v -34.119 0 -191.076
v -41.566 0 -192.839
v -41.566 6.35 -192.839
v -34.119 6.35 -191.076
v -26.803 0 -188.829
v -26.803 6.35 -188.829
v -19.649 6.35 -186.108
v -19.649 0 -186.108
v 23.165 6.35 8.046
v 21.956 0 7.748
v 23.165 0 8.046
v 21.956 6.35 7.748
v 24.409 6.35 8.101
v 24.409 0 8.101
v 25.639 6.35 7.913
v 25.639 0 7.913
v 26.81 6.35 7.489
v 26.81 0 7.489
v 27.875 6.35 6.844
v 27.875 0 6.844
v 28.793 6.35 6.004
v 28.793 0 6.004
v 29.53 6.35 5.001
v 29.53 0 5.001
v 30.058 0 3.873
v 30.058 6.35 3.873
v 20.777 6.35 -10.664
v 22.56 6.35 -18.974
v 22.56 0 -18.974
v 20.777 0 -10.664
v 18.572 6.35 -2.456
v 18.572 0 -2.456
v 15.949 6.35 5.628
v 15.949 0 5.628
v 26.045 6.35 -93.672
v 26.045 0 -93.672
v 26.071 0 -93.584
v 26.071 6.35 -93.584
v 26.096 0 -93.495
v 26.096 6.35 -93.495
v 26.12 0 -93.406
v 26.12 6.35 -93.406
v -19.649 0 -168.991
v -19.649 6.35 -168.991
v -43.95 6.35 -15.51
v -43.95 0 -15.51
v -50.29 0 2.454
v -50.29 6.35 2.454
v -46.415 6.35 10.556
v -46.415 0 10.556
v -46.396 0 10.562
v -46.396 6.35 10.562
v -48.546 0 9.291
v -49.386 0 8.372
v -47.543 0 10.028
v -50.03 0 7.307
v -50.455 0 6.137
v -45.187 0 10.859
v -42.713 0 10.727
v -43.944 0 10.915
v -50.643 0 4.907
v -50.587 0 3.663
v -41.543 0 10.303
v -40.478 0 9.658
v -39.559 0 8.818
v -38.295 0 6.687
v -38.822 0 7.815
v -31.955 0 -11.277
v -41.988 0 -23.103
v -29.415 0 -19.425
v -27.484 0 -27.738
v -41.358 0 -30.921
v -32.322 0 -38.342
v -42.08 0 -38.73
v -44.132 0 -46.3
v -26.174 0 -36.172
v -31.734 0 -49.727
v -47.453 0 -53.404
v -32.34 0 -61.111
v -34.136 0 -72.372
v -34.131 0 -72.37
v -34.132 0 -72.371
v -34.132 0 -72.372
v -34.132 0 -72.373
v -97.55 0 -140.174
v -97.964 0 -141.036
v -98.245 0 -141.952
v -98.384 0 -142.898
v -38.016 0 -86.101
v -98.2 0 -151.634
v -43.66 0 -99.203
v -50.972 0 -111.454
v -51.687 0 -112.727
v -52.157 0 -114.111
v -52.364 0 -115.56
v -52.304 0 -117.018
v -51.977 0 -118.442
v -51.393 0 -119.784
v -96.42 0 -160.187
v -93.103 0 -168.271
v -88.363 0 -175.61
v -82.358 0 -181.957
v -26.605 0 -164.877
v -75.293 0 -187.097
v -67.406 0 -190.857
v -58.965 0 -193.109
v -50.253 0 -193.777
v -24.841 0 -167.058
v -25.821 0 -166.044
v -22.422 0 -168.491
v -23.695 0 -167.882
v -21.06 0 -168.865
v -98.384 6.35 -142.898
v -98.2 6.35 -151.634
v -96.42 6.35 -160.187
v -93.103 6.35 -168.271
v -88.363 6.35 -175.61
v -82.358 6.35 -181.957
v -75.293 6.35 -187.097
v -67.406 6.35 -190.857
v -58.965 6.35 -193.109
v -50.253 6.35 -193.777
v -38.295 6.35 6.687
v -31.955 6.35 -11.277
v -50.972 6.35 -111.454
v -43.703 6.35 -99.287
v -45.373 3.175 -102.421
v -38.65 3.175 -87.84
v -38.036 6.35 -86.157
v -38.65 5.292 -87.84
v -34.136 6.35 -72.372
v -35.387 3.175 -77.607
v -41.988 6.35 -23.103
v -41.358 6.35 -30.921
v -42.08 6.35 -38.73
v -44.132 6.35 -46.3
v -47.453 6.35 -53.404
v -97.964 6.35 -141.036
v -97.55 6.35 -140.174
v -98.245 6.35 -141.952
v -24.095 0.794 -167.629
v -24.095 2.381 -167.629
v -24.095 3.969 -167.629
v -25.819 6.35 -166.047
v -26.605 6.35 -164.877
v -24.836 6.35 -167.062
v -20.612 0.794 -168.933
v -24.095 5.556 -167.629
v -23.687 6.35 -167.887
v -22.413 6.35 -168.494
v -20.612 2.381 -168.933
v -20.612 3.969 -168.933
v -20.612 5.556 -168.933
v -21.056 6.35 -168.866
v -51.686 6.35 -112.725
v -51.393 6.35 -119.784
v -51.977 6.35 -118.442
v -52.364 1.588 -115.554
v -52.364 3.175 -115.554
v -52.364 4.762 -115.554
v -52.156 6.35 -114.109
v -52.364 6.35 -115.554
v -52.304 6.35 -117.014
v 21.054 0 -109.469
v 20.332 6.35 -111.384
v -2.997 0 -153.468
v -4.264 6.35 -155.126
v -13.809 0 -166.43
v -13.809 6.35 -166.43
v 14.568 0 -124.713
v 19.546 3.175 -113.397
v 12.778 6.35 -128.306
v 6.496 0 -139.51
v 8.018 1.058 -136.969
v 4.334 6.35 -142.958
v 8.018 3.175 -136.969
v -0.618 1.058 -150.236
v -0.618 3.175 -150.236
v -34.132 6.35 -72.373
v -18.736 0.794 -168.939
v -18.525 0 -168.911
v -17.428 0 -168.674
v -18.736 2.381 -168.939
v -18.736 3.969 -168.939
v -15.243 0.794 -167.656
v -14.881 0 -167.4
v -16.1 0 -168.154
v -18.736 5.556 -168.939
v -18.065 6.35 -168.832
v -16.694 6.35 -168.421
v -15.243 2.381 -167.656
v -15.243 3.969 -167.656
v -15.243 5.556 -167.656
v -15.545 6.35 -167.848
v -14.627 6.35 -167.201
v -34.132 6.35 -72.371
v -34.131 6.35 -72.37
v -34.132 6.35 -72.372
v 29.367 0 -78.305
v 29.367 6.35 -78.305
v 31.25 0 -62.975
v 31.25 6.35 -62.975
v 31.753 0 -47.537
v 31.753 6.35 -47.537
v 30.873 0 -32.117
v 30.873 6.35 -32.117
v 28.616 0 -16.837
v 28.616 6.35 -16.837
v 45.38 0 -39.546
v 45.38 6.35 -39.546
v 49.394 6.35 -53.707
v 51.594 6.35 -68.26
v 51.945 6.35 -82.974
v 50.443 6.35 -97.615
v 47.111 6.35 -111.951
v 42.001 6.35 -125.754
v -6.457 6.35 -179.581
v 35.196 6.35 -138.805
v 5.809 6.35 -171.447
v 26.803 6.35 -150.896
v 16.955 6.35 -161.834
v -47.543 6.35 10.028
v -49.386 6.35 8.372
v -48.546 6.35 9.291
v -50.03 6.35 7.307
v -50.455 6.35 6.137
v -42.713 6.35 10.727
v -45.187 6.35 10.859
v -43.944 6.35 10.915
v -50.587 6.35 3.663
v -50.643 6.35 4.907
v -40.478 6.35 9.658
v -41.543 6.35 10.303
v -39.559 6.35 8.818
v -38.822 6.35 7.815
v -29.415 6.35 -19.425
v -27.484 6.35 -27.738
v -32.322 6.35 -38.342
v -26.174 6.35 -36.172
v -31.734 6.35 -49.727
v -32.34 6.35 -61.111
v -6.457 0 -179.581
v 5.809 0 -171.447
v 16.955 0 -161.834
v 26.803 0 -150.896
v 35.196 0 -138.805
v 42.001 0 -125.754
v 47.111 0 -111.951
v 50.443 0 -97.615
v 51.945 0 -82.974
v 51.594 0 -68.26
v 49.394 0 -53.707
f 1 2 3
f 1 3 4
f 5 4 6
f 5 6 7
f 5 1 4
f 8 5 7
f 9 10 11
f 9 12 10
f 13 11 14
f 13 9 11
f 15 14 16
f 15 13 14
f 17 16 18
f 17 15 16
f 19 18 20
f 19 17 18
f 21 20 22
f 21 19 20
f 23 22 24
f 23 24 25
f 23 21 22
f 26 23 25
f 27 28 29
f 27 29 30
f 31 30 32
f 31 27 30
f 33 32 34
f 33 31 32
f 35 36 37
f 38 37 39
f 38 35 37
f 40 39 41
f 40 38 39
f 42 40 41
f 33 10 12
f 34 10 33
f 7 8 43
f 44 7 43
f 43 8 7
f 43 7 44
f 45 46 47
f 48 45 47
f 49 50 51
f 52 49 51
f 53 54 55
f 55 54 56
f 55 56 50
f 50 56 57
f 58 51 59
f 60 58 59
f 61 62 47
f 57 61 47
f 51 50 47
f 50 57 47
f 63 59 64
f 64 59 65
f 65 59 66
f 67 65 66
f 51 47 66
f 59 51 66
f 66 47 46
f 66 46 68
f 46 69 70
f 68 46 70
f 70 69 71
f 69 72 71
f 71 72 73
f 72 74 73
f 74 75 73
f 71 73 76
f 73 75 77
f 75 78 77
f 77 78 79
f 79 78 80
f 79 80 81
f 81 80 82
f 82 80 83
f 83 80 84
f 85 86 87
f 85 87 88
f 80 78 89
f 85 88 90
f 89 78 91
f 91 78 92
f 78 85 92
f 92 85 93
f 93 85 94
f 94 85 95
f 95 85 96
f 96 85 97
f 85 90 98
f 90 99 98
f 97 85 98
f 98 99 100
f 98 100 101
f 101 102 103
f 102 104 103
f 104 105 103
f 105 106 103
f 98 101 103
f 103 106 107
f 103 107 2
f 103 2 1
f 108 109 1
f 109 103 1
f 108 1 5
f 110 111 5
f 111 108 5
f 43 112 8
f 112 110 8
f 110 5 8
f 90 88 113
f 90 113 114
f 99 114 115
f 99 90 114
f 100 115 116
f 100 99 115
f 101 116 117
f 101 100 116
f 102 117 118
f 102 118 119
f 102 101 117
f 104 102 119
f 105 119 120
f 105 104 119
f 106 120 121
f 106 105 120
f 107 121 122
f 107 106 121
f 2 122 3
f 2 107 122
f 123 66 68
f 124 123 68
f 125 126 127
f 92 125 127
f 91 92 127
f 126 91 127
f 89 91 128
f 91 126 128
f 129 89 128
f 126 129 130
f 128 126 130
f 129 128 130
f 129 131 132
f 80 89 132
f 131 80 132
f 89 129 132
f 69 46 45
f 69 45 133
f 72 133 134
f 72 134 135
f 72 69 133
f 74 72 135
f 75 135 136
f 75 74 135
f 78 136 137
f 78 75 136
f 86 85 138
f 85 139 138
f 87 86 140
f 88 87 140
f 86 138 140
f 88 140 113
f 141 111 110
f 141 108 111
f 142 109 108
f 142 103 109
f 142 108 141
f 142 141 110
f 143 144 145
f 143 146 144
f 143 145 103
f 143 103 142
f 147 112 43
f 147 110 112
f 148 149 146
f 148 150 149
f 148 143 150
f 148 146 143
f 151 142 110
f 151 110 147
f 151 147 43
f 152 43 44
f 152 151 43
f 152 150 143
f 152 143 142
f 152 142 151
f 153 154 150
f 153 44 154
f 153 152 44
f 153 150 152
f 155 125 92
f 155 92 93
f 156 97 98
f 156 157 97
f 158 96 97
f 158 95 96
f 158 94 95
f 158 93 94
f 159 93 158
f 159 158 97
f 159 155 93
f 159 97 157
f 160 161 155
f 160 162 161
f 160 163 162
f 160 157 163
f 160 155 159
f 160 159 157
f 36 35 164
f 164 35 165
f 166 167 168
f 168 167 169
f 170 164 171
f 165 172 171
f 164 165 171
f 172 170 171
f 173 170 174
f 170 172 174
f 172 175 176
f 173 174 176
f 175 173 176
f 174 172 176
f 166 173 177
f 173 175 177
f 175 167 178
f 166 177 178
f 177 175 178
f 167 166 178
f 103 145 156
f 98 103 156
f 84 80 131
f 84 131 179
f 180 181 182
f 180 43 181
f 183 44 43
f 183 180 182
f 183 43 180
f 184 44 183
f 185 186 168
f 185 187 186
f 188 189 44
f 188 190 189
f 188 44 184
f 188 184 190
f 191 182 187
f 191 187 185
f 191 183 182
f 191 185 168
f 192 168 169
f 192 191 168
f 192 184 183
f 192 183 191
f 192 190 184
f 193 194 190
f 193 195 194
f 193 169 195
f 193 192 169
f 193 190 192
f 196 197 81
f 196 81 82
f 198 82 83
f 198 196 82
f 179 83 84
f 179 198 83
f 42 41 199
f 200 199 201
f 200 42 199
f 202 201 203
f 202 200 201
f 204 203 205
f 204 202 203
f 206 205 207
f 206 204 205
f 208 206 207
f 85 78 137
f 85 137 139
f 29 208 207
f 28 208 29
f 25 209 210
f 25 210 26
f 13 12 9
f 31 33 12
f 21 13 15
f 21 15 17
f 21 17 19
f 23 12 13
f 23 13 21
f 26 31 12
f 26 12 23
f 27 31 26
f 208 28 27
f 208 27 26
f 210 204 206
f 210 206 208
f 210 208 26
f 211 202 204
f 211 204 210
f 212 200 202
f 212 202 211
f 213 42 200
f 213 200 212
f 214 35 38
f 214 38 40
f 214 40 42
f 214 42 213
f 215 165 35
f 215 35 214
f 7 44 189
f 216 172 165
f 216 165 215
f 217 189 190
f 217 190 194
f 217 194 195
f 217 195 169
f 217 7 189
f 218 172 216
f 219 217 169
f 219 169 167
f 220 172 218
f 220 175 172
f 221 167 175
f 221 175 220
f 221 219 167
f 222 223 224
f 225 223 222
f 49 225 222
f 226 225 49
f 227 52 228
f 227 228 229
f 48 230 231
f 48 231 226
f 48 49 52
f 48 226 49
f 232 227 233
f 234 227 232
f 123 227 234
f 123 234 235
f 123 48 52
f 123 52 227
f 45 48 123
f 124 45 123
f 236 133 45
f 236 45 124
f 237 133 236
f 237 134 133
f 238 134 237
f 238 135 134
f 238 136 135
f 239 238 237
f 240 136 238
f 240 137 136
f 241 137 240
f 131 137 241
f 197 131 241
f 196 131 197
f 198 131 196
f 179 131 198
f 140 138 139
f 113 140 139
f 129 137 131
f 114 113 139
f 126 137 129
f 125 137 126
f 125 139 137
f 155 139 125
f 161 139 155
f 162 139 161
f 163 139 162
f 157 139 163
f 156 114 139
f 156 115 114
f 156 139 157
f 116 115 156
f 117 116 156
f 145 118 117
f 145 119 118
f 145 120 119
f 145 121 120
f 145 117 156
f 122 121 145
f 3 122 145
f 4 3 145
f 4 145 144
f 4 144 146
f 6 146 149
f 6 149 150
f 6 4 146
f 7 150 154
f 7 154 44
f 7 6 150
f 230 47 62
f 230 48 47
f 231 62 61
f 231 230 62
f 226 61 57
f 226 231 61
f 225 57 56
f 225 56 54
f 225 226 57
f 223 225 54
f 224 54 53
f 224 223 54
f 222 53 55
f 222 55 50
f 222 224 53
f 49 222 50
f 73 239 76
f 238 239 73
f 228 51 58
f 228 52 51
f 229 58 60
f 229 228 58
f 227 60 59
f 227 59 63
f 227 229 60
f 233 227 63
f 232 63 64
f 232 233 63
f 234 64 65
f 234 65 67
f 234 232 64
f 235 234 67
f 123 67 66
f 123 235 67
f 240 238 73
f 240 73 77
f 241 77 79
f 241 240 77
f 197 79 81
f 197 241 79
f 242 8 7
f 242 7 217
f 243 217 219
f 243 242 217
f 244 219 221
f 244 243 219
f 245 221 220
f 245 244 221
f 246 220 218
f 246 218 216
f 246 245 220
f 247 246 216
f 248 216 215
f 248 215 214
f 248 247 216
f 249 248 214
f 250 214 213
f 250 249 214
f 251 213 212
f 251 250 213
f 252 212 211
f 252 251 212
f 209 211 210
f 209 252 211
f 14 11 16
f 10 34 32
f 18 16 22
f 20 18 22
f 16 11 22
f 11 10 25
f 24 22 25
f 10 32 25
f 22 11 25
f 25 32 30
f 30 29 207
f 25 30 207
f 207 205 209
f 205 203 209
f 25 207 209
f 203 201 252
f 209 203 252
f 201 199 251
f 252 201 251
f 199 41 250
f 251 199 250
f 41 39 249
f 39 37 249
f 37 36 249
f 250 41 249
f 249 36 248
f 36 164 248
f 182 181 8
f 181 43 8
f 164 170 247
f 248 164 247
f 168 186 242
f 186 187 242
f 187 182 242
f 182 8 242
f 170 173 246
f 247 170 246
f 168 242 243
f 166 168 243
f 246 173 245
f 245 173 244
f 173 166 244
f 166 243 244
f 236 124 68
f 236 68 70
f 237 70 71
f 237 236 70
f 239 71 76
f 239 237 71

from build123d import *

# Parameters (mm, degrees)
BOSS_EXTRUDE1_DEPTH    = 6.35
CUT_EXTRUDE1_DEPTH     = 218.474824132
CUT_EXTRUDE2_DEPTH     = 218.474824132
BOSS_EXTRUDE2_DEPTH    = 6.35
FILLET1_R              = 6.35
SPLIT1_SURFACE_1_BACK  = 255.18
SPLIT1_SURFACE_1_DEPTH = 510.36
SPLIT1_SURFACE_2_BACK  = 255.18
SPLIT1_SURFACE_2_DEPTH = 510.36


with BuildPart() as part:
    # Sketch1 → Boss-Extrude1 (new body)
    with BuildSketch(Plane(origin=(0, 0, 0), x_dir=(1, 0, 0), z_dir=(0, 1, 0))):
        with BuildLine():
            Line((-47.453228006, 53.404284402), (-98.253228006, 141.392465427))
            ThreePointArc((-98.253228006, 141.392465427), (-82.921975522, 181.453316928), (-41.566473575, 192.839342769))
            ThreePointArc((-41.566473575, 192.839342769), (36.836225704, 136.004392842), (45.380299153, 39.546144899))
            Line((45.380299153, 39.546144899), (27.944541838, -9.861512816))
            Line((27.944541838, -9.861512816), (0, 0))
            Line((0, 0), (-43.950457827, 15.509934128))
            ThreePointArc((-43.950457827, 15.509934128), (-41.550098289, 34.840876427), (-47.453228006, 53.404284402))
        make_face()
    extrude(amount=BOSS_EXTRUDE1_DEPTH)

    # Sketch5 → Cut-Extrude1 (cut, through all)
    with BuildSketch(Plane(origin=(0, 6.35, 0), x_dir=(1, 0, 0), z_dir=(0, 1, 0))):
        with BuildLine():
            Line((-29.23664893, 81.427581144), (15.574383155, 98.792652007))
            ThreePointArc((15.574383155, 98.792652007), (22.053436092, 98.460407789), (26.120098061, 93.405630482))
            ThreePointArc((26.120098061, 93.405630482), (31.67419382, 55.261505814), (28.616328902, 16.836622098))
            Line((28.616328902, 16.836622098), (22.559524164, 18.974043348))
            ThreePointArc((22.559524164, 18.974043348), (19.726825076, 6.545871538), (15.949337201, -5.628454892))
            Line((15.949337201, -5.628454892), (-31.95525319, 11.276876204))
            ThreePointArc((-31.95525319, 11.276876204), (-28.372538305, 23.563648828), (-26.173781301, 36.171824553))
            Line((-26.173781301, 36.171824553), (-32.322028113, 38.341515332))
            ThreePointArc((-32.322028113, 38.341515332), (-31.887912186, 55.427050363), (-34.131380562, 72.370214577))
            ThreePointArc((-34.131380562, 72.370214577), (-33.353370645, 77.801041885), (-29.23664893, 81.427581144))
        make_face()
    extrude(amount=-CUT_EXTRUDE1_DEPTH, mode=Mode.SUBTRACT)

    # Sketch6 → Cut-Extrude2 (cut, through all)
    with BuildSketch(Plane(origin=(0, 6.35, 0), x_dir=(1, 0, 0), z_dir=(0, 1, 0))):
        with BuildLine():
            Line((-34.136031583, 72.371811773), (26.116293886, 93.401758977))
            add(Edge.make_bspline(
                [(26.116293886, 93.401758977), (24.324889601, 100.23803776), (22.130168151, 106.901258397), (16.96212823, 119.893613822), (13.988046064, 126.222420918), (9.776956475, 133.921680991), (8.910007749, 135.450921337), (7.126151123, 138.487965199), (6.207974968, 139.997768114), (3.386426272, 144.480432789), (1.42392697, 147.394611788), (-4.701484626, 155.920269738), (-9.100754748, 161.316287945), (-13.809441186, 166.430246232)],
                knots=[0, 0, 0, 0, 0.25, 0.25, 0.5, 0.5, 0.5625, 0.5625, 0.625, 0.625, 0.75, 0.75, 1, 1, 1, 1], degree=3))
            add(Edge.make_bspline(
                [(-26.604572492, 164.8773905), (-26.150591479, 165.703254328), (-25.515446259, 166.400295605), (-24.879031904, 167.098729697), (-24.095373437, 167.628794259), (-23.313760397, 168.1574753), (-22.428907317, 168.488425961), (-21.547481327, 168.818094831), (-20.612298709, 168.932538075), (-19.674896196, 169.047252981), (-18.735576663, 168.938540794), (-17.797334242, 168.829953267), (-16.909699728, 168.503685222), (-16.026331795, 168.178985445), (-15.242553256, 167.655985099), (-14.452846951, 167.129029268), (-13.809441186, 166.430246232)],
                knots=[0, 0, 0, 0.125, 0.125, 0.25, 0.25, 0.375, 0.375, 0.5, 0.5, 0.625, 0.625, 0.75, 0.75, 0.875, 0.875, 1, 1, 1], degree=2))
            Line((-26.604572492, 164.8773905), (-51.39264493, 119.783935416))
            add(Edge.make_bspline(
                [(-50.971516495, 111.453693883), (-51.597295758, 112.361285599), (-51.952278538, 113.405618938), (-52.307499269, 114.450652309), (-52.364051333, 115.554155451), (-52.420577964, 116.657162304), (-52.173441916, 117.734834771), (-51.926064332, 118.813560494), (-51.39264493, 119.783935416)],
                knots=[0, 0, 0, 0.25, 0.25, 0.5, 0.5, 0.75, 0.75, 1, 1, 1], degree=2))
            add(Edge.make_bspline(
                [(-50.971516495, 111.453693883), (-48.958817602, 108.534599247), (-47.092599274, 105.523689489), (-43.653878745, 99.317766492), (-42.08164257, 96.122586505), (-39.950407344, 91.187456603), (-39.27814351, 89.518531936), (-38.021441634, 86.160956199), (-37.435479748, 84.468826365), (-36.34793939, 81.058006993), (-35.846327383, 79.339328012), (-34.927561091, 75.875386956), (-34.510190541, 74.129079907), (-34.136031583, 72.371811773)],
                knots=[0, 0, 0, 0, 0.25, 0.25, 0.5, 0.5, 0.625, 0.625, 0.75, 0.75, 0.875, 0.875, 1, 1, 1, 1], degree=3))
        make_face()
    extrude(amount=-CUT_EXTRUDE2_DEPTH, mode=Mode.SUBTRACT)

    # Sketch7 → Boss-Extrude2 (add)
    with BuildSketch(Plane(origin=(0, 0, 0), x_dir=(1, 0, 0), z_dir=(0, 1, 0))):
        Polygon((-43.950457827, 15.509934128), (-52.403123375, -8.442361068), (-40.408086707, -12.675359716), (-31.95525319, 11.276876204), align=None)
    extrude(amount=BOSS_EXTRUDE2_DEPTH)

    # Fillet1
    fillet1_edges = [part.edges().sort_by_distance(p)[0] for p in [
        (-98.253228006, 3.175, -141.392465427),
        (27.944541838, 3.175, 9.861512816),
        (-52.403123375, 3.175, 8.442361068),
        (-40.408086707, 3.175, 12.675359716),
    ]]
    fillet(fillet1_edges, radius=FILLET1_R)


with BuildPart() as body_2:
    # Split1: the piece behind the surface
    add(part.part)
    # Split1 surface: a surface, the sketch's curves swept straight by 510.36 mm
    with BuildLine(Plane(origin=(0, 6.35, 0), x_dir=(1, 0, 0), z_dir=(0, 1, 0)).offset(-SPLIT1_SURFACE_1_BACK), mode=Mode.PRIVATE) as split1_surface_1_path:
        Line((-19.649206058, 186.1076897), (-19.649206058, 168.991436526))
    split1_surface_1 = Shell.extrude(split1_surface_1_path.wire(), (0 * SPLIT1_SURFACE_1_DEPTH, 1 * SPLIT1_SURFACE_1_DEPTH, 0 * SPLIT1_SURFACE_1_DEPTH))
    split(bisect_by=split1_surface_1, keep=Keep.BOTTOM)


with BuildPart() as part_1:
    add(part.part)

    # Split1: split by a surface, the side it looks to stays
    # Split1 surface: a surface, the sketch's curves swept straight by 510.36 mm
    with BuildLine(Plane(origin=(0, 6.35, 0), x_dir=(1, 0, 0), z_dir=(0, 1, 0)).offset(-SPLIT1_SURFACE_2_BACK), mode=Mode.PRIVATE) as split1_surface_2_path:
        Line((-19.649206058, 186.1076897), (-19.649206058, 168.991436526))
    split1_surface_2 = Shell.extrude(split1_surface_2_path.wire(), (0 * SPLIT1_SURFACE_2_DEPTH, 1 * SPLIT1_SURFACE_2_DEPTH, 0 * SPLIT1_SURFACE_2_DEPTH))
    split(bisect_by=split1_surface_2, keep=Keep.TOP)


solid = Compound([body_2.part, part_1.part])
